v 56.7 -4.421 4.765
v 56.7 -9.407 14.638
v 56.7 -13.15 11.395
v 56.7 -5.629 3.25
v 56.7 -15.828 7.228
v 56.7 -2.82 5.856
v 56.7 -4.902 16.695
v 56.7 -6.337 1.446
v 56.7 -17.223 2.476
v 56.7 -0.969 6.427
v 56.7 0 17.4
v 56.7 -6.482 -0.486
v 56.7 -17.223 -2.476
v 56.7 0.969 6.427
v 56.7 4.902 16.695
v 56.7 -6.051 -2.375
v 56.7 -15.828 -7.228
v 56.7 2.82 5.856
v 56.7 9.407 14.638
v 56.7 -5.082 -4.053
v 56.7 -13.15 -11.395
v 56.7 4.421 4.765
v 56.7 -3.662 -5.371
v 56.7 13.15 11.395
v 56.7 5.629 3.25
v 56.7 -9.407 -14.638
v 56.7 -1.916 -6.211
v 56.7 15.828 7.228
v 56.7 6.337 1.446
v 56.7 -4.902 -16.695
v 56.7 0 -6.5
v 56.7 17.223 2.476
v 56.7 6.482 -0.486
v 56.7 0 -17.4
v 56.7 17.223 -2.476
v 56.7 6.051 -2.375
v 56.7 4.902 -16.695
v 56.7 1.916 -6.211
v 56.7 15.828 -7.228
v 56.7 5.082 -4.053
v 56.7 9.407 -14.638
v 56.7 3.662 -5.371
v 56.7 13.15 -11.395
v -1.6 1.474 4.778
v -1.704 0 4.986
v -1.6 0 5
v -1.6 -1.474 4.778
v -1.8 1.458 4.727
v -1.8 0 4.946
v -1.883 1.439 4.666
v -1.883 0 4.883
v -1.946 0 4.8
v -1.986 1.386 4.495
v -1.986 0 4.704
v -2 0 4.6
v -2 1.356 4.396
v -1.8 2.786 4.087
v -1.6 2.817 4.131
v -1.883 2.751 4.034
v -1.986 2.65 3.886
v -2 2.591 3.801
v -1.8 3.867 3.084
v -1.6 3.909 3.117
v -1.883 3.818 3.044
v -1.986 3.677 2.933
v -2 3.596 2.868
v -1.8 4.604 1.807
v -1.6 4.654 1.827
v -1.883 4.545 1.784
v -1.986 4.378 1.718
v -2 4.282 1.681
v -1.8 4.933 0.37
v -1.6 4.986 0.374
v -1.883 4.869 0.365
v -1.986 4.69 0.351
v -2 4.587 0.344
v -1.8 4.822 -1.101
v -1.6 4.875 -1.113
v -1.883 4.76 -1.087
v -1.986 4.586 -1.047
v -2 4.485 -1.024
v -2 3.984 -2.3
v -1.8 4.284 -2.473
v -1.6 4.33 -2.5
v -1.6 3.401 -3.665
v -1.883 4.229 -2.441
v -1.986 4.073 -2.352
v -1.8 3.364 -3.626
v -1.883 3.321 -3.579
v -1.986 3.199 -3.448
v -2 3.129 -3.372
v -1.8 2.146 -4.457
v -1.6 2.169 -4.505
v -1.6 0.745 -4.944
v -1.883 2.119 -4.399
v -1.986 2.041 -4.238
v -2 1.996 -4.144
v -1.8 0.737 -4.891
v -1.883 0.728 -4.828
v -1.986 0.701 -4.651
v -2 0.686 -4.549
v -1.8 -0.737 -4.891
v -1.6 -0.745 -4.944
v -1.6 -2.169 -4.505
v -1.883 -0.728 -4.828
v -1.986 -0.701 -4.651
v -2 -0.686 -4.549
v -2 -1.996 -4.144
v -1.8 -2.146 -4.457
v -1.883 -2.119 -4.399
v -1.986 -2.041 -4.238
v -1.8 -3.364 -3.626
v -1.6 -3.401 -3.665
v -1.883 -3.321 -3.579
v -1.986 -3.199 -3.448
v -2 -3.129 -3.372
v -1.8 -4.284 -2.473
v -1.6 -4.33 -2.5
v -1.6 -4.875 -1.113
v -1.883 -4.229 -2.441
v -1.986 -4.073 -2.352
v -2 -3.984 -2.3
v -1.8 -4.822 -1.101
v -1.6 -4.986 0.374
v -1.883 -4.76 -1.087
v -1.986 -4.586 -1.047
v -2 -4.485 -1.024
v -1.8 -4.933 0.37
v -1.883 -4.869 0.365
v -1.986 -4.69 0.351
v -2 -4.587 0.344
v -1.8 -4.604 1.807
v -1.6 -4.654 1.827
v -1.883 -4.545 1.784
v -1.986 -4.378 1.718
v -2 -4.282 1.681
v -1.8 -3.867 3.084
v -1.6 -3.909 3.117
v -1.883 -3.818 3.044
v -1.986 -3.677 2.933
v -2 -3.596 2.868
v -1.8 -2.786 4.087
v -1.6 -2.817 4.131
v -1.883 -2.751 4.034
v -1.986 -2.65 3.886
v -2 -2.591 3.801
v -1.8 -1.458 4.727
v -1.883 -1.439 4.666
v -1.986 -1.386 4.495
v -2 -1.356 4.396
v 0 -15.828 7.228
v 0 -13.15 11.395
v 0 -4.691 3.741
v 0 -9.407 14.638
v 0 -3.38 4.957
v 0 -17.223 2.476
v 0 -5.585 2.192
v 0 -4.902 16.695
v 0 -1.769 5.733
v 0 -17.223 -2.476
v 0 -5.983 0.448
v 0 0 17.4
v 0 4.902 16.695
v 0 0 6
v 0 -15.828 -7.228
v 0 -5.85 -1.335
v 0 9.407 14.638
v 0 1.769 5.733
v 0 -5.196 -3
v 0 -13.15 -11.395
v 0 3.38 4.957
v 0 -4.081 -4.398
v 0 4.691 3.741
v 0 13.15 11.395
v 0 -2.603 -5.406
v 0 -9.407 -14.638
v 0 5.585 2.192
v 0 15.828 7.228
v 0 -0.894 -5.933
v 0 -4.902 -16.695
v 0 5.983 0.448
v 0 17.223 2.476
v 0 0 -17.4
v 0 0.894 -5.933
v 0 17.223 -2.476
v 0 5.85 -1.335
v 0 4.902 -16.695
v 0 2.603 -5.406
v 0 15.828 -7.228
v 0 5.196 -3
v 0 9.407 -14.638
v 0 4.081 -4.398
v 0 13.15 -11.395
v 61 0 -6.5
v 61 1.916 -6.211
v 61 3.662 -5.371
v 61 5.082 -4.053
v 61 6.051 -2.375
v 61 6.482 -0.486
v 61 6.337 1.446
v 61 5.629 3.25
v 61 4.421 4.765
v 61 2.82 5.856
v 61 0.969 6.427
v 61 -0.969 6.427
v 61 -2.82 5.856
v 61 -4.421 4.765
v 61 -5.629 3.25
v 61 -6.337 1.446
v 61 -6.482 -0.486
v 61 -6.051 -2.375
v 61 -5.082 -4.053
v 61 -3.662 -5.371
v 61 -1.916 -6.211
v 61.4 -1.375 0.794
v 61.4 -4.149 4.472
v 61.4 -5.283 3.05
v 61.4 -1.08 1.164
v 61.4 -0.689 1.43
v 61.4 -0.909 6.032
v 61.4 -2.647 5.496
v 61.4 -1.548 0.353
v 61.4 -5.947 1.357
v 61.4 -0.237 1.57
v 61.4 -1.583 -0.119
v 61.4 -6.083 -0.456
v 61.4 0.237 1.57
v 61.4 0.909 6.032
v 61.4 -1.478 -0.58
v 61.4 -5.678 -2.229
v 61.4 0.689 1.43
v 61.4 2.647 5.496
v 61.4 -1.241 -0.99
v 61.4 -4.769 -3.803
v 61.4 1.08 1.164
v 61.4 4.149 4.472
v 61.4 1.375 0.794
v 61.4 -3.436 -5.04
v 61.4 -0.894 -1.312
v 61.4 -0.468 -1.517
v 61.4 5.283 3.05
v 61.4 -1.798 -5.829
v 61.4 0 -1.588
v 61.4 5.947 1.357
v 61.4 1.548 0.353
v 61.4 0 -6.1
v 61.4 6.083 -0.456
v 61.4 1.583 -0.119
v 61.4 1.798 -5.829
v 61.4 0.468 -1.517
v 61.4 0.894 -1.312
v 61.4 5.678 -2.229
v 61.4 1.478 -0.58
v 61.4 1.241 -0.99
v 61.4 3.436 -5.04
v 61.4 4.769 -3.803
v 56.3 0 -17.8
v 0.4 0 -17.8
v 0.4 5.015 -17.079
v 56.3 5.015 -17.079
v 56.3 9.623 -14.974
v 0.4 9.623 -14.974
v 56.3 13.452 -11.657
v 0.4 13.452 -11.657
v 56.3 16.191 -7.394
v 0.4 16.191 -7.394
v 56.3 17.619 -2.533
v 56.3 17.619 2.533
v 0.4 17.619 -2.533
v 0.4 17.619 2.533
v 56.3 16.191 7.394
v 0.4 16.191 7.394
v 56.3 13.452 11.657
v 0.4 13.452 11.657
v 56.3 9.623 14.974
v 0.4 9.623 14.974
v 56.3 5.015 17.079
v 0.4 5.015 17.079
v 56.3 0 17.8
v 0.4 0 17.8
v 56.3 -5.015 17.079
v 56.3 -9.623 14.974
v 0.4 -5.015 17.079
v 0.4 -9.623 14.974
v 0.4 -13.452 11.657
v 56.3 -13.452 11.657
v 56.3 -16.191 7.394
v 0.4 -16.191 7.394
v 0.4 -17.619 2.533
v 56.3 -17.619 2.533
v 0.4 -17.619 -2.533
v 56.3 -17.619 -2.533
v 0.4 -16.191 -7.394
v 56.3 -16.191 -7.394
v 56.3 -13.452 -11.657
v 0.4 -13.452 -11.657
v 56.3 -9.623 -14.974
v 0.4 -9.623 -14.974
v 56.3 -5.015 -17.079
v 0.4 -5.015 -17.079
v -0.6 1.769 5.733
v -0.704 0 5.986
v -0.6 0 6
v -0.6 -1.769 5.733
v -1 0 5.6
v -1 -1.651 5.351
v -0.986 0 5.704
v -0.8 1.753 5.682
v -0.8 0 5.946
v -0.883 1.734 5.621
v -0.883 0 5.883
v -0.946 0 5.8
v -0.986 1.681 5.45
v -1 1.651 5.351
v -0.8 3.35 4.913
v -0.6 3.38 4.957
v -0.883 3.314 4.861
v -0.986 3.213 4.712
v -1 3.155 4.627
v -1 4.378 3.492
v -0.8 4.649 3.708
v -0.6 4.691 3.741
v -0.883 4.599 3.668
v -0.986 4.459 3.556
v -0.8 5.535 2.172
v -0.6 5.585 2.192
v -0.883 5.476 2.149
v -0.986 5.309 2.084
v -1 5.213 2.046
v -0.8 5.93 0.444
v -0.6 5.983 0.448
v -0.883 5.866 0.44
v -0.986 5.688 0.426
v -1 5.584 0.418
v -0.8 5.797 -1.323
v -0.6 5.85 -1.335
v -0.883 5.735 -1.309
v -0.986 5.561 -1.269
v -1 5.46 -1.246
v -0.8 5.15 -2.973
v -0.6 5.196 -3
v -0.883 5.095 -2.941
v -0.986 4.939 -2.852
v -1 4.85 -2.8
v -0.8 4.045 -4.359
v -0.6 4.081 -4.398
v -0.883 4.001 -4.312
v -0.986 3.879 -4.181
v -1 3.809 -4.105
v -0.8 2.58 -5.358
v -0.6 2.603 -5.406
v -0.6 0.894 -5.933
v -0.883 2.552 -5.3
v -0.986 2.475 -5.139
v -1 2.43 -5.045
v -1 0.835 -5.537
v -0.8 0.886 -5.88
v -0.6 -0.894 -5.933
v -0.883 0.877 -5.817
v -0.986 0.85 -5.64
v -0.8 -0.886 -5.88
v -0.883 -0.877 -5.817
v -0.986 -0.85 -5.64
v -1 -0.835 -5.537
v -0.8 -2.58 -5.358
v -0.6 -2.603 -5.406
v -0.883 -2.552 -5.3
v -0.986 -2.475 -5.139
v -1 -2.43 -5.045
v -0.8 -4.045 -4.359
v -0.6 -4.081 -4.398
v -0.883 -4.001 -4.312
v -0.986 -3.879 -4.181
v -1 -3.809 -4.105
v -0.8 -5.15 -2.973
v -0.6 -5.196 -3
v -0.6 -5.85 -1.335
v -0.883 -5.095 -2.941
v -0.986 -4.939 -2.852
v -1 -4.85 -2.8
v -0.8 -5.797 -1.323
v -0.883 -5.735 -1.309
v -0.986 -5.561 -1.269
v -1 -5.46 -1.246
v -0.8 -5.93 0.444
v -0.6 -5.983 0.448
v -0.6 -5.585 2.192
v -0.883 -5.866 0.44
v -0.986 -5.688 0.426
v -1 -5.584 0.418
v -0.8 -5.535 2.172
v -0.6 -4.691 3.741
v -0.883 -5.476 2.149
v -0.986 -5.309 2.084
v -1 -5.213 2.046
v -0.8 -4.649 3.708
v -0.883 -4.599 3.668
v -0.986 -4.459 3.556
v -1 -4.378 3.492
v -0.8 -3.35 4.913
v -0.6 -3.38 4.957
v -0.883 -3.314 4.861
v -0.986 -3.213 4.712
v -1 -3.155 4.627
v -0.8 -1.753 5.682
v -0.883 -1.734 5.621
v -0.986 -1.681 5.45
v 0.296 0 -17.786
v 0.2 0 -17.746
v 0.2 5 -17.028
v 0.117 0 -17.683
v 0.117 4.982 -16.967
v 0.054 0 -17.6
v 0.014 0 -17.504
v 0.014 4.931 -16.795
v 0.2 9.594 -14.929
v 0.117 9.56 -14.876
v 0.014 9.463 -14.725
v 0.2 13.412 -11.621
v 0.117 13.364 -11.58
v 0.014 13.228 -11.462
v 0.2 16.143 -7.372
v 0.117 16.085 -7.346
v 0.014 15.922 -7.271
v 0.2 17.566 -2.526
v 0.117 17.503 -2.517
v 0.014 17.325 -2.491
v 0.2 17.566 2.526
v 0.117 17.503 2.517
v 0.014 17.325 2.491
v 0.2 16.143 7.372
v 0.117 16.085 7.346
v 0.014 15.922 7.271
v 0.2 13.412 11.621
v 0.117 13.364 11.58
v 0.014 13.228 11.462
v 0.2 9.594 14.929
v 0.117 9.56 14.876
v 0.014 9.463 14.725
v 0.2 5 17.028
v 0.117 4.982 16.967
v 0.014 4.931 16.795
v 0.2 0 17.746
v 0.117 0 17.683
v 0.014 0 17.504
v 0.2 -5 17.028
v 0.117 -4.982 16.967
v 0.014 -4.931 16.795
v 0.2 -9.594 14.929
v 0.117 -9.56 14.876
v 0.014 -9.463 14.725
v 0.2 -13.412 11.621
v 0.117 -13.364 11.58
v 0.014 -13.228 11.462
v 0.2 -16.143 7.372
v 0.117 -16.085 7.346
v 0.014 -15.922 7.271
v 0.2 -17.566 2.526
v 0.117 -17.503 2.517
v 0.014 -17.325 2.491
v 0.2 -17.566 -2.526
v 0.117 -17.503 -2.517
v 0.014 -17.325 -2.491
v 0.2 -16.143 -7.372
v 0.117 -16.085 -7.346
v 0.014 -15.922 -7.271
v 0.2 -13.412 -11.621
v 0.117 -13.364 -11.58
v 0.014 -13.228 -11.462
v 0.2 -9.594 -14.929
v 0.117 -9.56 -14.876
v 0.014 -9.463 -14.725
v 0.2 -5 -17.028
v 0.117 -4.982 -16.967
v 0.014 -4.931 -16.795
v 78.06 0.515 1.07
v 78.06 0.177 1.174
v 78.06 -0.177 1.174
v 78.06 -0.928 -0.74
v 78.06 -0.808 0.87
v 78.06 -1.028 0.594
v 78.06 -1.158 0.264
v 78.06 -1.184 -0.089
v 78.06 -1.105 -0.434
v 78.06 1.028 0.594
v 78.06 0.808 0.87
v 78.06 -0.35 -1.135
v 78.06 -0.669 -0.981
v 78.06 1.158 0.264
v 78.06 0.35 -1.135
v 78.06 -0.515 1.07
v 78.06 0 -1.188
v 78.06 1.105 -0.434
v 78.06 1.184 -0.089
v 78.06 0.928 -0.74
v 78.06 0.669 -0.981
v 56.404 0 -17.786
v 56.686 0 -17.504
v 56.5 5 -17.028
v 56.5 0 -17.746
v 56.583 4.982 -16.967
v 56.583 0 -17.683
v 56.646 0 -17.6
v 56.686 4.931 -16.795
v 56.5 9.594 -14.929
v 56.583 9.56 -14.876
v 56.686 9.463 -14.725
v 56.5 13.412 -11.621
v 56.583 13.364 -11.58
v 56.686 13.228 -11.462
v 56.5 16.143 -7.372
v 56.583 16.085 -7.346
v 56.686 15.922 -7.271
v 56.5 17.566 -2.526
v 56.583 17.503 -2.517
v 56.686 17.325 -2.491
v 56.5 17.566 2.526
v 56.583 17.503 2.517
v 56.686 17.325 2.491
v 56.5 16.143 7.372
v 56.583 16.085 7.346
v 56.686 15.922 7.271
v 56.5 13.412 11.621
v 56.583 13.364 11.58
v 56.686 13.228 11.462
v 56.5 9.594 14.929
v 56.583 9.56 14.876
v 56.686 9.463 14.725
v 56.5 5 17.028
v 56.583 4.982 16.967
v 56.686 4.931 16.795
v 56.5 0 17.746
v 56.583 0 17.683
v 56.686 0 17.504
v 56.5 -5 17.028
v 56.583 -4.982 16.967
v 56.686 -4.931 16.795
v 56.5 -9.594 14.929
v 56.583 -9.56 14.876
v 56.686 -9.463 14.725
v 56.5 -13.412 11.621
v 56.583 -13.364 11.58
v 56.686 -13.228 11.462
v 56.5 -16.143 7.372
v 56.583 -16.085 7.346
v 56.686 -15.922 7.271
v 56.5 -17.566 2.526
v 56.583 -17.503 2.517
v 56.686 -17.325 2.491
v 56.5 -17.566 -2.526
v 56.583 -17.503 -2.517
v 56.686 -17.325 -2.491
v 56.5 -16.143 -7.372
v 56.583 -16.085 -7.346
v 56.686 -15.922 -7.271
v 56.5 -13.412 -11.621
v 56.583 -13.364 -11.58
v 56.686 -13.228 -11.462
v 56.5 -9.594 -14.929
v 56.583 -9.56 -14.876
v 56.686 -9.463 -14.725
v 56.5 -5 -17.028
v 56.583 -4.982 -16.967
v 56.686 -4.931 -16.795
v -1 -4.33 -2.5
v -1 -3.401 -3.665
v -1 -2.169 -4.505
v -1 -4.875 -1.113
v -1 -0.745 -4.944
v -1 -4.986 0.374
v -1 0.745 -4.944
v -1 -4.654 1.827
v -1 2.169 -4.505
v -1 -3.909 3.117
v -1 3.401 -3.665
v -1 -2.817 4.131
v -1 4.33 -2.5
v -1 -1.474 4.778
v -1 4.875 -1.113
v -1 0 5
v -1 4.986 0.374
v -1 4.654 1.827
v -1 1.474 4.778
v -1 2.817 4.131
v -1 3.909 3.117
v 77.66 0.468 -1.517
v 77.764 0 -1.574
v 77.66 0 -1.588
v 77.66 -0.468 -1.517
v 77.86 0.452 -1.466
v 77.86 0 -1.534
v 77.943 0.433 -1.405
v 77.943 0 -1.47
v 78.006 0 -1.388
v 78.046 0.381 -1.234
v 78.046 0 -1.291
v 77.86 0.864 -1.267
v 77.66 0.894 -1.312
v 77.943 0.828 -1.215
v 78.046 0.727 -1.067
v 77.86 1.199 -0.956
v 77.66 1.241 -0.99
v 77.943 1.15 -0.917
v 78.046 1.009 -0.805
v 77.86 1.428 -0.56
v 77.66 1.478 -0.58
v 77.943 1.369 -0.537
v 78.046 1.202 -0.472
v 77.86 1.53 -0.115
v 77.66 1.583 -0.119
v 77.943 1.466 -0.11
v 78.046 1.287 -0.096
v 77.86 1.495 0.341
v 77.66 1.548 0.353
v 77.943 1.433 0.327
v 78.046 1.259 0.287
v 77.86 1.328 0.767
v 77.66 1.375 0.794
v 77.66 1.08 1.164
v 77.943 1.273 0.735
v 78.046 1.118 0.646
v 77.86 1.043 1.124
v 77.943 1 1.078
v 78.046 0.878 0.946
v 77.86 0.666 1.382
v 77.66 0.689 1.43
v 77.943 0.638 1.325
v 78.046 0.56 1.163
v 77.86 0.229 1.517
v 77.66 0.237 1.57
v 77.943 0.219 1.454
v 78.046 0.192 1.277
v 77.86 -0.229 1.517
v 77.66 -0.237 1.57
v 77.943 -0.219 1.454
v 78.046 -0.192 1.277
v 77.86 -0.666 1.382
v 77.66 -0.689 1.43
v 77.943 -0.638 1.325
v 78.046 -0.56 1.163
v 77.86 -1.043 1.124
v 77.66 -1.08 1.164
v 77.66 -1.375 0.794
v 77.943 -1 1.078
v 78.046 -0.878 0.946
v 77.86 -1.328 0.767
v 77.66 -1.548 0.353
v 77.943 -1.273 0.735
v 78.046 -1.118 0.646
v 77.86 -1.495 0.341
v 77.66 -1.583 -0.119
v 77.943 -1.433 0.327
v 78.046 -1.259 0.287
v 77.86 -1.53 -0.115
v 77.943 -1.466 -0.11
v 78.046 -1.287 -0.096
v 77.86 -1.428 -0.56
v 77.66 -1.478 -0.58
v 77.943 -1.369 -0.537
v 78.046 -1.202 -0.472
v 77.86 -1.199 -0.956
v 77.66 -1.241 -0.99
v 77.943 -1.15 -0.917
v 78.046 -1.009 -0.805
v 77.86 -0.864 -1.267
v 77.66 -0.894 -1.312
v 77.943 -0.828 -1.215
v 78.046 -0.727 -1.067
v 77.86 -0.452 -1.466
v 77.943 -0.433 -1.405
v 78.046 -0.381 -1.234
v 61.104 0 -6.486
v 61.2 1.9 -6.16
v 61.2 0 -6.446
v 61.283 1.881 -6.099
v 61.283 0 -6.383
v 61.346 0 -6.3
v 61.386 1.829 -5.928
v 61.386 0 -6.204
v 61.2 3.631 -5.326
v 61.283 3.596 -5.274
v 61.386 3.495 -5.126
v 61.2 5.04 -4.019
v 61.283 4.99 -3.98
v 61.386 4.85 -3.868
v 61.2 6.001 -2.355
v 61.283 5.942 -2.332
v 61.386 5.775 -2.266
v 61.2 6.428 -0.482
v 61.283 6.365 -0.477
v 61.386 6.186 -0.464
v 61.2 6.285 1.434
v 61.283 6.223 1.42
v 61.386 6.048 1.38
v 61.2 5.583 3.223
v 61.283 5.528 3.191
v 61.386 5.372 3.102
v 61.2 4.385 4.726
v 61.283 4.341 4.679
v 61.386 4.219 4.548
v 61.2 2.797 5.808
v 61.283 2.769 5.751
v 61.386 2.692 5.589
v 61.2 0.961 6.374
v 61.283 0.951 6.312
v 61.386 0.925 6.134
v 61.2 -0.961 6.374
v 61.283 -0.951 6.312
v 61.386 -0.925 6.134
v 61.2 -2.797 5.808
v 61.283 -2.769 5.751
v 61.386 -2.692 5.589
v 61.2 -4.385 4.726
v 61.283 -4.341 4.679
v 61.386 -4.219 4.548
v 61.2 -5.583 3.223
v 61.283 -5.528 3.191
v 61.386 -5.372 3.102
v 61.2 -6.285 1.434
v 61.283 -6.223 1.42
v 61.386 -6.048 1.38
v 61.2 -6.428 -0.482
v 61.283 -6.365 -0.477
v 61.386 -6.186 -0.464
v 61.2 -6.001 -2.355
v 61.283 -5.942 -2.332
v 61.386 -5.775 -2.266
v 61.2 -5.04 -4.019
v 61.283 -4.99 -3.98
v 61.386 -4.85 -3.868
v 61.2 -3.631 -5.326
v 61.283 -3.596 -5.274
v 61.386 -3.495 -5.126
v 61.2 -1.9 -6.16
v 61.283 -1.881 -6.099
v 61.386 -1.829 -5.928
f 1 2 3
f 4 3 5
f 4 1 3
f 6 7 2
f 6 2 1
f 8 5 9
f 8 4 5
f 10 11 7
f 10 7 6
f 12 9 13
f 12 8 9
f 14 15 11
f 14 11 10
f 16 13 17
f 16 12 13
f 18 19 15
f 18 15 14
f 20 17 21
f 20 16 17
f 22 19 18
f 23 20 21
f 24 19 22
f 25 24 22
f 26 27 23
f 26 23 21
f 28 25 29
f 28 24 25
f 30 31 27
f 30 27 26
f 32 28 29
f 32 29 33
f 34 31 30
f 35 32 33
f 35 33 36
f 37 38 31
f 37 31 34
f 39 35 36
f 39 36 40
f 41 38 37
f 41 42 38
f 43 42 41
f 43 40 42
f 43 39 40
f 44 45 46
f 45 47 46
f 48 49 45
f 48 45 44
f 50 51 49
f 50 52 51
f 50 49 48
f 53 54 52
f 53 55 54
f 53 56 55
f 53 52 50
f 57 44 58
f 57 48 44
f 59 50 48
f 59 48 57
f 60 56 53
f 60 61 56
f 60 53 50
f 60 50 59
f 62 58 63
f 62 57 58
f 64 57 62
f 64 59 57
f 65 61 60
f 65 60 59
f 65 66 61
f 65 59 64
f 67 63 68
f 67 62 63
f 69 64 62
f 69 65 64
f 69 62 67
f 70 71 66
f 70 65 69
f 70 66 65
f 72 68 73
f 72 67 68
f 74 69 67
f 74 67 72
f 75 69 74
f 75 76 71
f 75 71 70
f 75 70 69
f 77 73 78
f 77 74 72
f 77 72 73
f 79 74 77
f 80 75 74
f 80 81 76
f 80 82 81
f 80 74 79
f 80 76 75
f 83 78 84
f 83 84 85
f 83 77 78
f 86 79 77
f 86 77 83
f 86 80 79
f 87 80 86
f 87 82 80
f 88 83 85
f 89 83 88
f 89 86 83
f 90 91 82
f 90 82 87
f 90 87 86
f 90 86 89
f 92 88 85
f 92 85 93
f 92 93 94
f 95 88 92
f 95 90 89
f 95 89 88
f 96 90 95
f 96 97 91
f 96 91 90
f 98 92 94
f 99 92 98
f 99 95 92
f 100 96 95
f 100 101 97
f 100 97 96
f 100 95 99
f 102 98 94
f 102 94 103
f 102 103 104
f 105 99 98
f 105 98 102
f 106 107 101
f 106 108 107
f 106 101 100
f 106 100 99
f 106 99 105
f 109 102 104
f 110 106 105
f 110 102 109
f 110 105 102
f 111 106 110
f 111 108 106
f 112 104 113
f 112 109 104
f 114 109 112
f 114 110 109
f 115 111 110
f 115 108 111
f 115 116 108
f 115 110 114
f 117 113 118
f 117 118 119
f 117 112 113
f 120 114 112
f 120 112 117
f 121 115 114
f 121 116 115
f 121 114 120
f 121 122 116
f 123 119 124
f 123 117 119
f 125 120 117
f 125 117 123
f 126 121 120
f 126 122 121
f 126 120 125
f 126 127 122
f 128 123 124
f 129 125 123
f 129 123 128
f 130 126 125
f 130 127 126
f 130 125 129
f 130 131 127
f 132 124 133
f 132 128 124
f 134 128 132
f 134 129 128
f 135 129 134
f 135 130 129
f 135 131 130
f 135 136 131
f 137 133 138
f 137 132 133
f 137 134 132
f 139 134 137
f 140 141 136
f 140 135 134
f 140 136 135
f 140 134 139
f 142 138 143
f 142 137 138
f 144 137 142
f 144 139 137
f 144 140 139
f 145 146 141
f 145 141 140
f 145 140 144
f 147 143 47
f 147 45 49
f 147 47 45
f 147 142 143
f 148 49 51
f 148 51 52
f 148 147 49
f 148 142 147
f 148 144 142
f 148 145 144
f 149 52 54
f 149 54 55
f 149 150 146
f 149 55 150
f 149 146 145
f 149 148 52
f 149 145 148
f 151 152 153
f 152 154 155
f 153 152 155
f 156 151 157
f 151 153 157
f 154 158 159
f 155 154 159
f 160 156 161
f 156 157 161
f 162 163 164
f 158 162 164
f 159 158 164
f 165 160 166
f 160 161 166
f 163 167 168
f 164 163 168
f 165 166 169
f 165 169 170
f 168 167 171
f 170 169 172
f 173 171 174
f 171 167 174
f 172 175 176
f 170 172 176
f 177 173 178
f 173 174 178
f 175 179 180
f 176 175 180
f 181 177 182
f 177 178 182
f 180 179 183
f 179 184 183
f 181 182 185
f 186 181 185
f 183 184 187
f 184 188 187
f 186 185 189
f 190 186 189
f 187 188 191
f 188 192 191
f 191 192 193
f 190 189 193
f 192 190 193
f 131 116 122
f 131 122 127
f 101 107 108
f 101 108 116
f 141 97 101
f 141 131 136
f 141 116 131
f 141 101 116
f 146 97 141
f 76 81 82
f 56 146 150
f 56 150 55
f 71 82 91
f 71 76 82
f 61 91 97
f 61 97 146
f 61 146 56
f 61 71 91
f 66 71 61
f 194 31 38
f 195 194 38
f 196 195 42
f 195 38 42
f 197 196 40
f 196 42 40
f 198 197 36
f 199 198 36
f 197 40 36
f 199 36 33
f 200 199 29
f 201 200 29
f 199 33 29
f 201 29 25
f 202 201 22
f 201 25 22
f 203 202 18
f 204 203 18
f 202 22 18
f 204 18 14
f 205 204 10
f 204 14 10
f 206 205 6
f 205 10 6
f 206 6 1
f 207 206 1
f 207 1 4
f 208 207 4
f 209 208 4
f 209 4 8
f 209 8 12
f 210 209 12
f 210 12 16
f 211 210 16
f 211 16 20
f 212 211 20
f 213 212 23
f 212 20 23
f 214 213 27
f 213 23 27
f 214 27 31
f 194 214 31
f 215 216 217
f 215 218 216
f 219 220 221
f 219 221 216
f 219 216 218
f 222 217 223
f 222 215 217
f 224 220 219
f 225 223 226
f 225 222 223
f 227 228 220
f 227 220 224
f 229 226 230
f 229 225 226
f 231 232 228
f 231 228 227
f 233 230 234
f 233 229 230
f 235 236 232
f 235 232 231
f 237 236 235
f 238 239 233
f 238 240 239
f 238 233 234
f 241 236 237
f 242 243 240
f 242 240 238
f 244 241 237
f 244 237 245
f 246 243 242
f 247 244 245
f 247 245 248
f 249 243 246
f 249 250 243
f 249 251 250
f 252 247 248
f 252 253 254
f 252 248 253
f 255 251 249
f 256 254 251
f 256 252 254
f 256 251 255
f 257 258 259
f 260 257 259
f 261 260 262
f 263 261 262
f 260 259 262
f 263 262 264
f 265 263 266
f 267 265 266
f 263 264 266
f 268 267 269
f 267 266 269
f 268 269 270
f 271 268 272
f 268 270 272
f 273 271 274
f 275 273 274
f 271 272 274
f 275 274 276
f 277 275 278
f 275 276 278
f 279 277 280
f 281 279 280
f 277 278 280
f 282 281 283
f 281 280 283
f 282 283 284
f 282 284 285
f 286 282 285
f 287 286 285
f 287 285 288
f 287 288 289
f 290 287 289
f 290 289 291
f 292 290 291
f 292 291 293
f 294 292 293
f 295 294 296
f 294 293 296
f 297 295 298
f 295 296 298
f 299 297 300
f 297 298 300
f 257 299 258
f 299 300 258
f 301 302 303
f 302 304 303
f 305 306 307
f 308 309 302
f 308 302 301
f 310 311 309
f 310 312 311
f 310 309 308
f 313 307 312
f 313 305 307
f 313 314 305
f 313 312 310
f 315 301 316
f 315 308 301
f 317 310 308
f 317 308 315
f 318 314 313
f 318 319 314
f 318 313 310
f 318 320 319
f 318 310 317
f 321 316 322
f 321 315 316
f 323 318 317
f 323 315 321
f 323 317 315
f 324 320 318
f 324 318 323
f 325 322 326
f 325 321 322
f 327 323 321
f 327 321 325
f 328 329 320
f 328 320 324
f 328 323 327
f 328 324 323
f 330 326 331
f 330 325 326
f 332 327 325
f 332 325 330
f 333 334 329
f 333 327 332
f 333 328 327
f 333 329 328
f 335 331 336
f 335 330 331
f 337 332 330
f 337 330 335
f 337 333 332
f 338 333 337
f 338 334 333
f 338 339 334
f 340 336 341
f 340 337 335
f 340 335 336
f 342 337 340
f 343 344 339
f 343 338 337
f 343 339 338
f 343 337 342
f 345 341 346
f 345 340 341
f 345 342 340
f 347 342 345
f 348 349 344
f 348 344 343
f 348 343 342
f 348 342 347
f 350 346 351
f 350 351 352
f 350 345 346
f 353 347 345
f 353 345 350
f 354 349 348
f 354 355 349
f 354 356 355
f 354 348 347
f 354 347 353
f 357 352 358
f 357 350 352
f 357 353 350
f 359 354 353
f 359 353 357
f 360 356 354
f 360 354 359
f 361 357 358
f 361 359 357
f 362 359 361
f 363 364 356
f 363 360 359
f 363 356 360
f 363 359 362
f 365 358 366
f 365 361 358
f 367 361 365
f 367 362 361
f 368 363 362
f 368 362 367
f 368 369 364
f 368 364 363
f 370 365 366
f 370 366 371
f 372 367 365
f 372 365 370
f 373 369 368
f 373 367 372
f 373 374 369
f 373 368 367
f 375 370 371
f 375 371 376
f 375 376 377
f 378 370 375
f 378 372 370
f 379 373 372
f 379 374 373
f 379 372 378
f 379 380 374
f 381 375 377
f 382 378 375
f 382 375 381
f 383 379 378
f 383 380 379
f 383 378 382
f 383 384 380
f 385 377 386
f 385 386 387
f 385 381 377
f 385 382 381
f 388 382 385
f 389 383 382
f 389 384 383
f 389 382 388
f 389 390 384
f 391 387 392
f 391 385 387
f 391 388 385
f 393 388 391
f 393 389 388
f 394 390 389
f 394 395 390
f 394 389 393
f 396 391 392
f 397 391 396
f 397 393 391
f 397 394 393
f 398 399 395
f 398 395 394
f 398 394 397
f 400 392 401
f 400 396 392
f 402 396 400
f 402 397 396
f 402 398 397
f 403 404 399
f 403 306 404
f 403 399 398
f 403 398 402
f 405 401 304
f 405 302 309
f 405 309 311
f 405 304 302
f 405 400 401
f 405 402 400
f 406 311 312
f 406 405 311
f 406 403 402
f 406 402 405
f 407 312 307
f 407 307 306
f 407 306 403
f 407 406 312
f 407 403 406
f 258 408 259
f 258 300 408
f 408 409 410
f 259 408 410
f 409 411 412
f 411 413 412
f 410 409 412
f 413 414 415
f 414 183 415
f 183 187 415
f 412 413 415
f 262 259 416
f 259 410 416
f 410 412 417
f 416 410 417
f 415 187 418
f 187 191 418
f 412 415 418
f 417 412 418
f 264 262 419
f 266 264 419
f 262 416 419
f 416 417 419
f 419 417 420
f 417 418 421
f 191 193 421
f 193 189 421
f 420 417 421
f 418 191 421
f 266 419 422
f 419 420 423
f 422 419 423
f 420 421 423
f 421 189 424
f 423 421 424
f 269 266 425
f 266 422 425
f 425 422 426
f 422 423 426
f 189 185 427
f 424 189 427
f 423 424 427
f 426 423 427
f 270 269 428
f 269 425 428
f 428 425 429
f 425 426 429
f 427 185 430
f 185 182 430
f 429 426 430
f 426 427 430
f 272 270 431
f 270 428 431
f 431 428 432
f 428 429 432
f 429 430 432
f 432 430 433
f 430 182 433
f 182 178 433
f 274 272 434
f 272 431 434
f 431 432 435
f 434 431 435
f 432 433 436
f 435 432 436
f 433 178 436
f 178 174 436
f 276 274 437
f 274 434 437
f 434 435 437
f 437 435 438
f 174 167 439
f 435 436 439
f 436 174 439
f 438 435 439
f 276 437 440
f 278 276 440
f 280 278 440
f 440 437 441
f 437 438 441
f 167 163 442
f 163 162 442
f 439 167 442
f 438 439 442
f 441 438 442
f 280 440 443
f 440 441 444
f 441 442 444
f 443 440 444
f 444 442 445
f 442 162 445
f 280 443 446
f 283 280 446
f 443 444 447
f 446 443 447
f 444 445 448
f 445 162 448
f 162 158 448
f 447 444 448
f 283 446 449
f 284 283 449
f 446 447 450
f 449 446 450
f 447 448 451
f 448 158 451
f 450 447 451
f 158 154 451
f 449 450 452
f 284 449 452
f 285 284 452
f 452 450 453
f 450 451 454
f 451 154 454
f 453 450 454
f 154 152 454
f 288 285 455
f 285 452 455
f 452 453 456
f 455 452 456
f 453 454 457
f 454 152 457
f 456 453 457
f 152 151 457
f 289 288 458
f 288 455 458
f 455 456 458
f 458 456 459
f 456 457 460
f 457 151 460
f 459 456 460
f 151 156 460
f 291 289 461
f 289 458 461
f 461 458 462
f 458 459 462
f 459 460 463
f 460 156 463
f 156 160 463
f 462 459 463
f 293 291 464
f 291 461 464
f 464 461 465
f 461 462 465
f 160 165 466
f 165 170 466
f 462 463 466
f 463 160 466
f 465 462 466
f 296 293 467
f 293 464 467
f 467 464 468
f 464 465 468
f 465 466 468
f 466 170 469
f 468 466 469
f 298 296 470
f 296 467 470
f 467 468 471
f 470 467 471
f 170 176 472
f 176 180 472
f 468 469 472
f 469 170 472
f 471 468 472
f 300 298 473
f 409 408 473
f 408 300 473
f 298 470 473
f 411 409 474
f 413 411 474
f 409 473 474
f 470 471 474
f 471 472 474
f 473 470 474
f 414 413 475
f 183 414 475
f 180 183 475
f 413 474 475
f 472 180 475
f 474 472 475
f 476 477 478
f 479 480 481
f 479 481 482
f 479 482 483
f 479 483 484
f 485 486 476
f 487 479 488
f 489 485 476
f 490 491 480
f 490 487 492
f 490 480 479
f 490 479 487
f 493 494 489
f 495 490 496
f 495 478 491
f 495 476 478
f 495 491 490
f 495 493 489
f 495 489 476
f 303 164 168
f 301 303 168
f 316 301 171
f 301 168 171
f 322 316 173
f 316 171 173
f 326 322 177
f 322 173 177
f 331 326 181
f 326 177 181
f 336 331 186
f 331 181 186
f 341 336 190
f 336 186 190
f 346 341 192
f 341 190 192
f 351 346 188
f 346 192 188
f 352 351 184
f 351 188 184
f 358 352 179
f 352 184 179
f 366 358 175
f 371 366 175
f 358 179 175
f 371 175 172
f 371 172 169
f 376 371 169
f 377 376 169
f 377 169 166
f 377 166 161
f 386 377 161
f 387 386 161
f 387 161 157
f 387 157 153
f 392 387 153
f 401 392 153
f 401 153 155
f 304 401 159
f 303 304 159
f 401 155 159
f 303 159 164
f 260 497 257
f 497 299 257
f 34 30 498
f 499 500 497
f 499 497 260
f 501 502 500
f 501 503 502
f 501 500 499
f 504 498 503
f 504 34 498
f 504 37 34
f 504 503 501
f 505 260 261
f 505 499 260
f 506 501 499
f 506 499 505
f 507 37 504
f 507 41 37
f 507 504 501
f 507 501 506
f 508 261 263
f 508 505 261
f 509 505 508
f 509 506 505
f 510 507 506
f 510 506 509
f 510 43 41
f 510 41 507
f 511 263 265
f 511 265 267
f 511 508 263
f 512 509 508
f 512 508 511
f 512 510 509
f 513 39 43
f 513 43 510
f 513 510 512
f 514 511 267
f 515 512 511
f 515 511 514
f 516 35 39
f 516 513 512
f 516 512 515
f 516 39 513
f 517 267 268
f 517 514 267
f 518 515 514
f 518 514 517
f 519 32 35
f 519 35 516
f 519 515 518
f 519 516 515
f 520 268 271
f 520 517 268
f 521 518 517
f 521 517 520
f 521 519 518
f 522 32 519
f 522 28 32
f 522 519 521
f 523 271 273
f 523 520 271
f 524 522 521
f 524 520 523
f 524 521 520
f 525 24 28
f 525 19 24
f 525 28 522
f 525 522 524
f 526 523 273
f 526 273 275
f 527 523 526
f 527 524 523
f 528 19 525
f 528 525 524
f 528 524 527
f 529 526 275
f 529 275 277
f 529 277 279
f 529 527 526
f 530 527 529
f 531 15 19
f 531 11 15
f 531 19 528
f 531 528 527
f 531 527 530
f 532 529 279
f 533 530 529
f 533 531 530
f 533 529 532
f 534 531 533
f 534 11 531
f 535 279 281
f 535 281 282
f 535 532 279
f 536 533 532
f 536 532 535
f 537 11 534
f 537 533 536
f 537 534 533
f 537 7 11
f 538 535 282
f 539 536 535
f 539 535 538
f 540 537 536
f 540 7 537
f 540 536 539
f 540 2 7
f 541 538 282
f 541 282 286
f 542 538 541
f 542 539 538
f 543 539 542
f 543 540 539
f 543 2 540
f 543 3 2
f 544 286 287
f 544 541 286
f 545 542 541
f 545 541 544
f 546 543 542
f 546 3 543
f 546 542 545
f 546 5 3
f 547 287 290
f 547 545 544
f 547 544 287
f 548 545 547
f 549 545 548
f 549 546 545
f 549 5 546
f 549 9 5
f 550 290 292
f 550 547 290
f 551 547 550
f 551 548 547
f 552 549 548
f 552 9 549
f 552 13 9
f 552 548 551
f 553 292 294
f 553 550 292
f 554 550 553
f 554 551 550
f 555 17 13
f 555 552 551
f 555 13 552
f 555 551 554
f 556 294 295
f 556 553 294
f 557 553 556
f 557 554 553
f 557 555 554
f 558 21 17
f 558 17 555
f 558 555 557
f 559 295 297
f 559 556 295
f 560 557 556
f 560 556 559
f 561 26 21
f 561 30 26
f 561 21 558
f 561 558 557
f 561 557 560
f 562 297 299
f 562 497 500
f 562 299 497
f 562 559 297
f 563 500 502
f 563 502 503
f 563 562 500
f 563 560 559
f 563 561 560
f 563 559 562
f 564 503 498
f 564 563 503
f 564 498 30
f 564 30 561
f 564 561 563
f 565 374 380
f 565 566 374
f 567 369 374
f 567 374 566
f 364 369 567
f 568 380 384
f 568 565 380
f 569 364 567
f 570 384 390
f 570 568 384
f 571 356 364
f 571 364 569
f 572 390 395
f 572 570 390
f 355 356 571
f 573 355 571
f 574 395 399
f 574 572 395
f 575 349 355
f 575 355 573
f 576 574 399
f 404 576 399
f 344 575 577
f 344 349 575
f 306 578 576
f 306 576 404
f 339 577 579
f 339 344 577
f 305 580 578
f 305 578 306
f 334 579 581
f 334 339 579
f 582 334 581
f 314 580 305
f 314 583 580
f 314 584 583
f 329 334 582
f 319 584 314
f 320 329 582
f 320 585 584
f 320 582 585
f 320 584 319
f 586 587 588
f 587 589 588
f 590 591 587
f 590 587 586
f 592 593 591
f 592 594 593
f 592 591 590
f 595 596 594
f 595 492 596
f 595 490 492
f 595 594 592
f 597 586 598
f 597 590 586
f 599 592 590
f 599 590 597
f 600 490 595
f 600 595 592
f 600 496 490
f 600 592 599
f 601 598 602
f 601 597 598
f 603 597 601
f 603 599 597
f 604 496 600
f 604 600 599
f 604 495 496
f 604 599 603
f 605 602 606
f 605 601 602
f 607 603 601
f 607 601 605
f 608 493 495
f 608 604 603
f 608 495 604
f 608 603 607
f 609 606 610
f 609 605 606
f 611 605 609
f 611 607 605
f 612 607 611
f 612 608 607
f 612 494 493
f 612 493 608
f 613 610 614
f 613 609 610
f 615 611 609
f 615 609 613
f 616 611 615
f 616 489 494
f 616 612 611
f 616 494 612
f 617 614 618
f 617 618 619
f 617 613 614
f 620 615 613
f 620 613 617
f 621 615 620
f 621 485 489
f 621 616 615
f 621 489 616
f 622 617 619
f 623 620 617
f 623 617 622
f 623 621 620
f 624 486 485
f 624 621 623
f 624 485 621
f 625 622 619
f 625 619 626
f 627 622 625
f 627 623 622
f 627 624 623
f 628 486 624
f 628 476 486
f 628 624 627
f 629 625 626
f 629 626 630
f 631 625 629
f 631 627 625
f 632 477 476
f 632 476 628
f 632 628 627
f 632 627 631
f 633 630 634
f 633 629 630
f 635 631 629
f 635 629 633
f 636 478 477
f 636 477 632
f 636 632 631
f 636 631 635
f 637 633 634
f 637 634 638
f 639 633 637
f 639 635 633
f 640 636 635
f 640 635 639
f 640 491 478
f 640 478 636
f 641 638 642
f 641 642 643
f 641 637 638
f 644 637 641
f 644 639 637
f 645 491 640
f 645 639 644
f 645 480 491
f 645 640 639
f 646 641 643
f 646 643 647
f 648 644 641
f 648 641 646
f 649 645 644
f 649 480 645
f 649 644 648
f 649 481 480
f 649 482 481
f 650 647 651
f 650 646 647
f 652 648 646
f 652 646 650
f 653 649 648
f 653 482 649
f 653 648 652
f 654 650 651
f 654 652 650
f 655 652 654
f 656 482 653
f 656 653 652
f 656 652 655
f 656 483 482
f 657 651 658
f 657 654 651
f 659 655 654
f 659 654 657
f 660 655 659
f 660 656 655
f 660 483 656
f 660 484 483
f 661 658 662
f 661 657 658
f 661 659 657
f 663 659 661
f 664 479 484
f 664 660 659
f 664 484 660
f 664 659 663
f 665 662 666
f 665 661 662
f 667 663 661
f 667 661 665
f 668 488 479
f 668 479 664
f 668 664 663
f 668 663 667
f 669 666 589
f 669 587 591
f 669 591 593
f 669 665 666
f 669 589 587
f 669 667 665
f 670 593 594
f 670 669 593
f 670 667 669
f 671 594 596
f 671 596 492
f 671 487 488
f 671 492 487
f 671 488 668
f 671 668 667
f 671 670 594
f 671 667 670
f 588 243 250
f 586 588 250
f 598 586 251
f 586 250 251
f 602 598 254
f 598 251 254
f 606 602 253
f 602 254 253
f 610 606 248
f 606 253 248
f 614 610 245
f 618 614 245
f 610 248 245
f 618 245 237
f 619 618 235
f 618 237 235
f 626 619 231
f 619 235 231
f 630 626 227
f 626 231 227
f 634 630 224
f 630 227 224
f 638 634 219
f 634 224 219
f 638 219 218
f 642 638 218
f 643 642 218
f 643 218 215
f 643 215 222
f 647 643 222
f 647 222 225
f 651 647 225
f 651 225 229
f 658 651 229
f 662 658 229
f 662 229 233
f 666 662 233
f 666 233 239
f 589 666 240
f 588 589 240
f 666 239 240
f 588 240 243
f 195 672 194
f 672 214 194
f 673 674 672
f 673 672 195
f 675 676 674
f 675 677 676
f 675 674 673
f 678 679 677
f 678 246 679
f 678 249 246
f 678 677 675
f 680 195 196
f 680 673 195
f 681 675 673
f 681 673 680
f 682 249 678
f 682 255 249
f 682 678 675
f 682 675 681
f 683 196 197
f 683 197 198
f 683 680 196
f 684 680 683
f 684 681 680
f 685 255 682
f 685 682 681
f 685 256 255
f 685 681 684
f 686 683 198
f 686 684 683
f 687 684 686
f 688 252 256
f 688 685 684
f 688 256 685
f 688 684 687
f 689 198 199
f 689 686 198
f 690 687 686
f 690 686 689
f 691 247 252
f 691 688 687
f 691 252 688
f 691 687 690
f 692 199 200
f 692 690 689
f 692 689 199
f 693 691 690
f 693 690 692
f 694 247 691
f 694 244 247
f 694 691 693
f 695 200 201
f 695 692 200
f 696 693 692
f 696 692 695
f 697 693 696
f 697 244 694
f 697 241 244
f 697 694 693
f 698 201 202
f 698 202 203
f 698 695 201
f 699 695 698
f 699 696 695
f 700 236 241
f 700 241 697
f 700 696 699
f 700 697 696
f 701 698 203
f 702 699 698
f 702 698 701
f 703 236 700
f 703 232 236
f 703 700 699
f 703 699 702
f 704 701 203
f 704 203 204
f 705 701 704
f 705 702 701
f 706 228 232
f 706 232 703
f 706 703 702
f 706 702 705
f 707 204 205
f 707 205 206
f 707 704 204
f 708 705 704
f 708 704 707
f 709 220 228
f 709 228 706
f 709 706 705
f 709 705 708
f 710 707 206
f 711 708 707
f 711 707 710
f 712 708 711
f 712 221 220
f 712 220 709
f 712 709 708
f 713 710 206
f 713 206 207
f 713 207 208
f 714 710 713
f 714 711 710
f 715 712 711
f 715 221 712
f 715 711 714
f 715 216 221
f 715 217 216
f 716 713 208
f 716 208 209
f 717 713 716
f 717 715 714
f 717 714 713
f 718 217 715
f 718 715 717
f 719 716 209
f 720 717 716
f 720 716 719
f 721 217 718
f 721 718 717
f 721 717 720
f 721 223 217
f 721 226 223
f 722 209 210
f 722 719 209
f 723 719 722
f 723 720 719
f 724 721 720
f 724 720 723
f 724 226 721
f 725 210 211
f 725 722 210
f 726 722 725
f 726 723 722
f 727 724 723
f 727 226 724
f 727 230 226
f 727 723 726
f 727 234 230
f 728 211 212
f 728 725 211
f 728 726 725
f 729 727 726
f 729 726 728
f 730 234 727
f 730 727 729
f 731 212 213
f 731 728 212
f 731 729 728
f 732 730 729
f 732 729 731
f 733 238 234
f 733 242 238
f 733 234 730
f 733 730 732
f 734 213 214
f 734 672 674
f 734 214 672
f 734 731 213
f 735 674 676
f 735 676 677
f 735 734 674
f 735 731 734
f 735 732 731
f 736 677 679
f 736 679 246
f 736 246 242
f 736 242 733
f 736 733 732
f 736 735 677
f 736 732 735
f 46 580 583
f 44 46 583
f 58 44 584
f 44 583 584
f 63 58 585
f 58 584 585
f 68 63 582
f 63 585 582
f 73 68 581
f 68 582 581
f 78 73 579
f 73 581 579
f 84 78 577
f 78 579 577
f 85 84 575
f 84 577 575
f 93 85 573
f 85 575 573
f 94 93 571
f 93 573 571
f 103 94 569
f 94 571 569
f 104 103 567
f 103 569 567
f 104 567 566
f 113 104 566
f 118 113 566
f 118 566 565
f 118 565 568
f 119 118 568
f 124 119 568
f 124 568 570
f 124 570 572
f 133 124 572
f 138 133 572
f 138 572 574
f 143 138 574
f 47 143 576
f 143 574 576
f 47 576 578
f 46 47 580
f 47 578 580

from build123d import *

# Parameters (mm, degrees)
CROQUIS1_R              = 17.8
SALIENTE_EXTRUIR1_DEPTH = 56.7
CROQUIS2_R              = 6
SALIENTE_EXTRUIR2_DEPTH = 1
CROQUIS3_R              = 5
SALIENTE_EXTRUIR3_DEPTH = 1
CROQUIS4_R              = 6.5
SALIENTE_EXTRUIR4_DEPTH = 4.7
CROQUIS5_R              = 1.5875
SALIENTE_EXTRUIR5_DEPTH = 16.66
REDONDEO1_R             = 0.4


with BuildPart() as part:
    # Croquis1 → Saliente-Extruir1 (new body)
    with BuildSketch(Plane(origin=(0, 0, 0), x_dir=(0, 0, -1), z_dir=(1, 0, 0))):
        Circle(CROQUIS1_R)
    extrude(amount=SALIENTE_EXTRUIR1_DEPTH)

    # Croquis2 → Saliente-Extruir2 (add)
    with BuildSketch(Plane.ZY):
        Circle(CROQUIS2_R)
    extrude(amount=SALIENTE_EXTRUIR2_DEPTH)

    # Croquis3 → Saliente-Extruir3 (add)
    with BuildSketch(Plane.ZY.offset(1)):
        Circle(CROQUIS3_R)
    extrude(amount=SALIENTE_EXTRUIR3_DEPTH)

    # Croquis4 → Saliente-Extruir4 (add)
    with BuildSketch(Plane(origin=(56.7, 0, 0), x_dir=(0, 0, -1), z_dir=(1, 0, 0))):
        Circle(CROQUIS4_R)
    extrude(amount=SALIENTE_EXTRUIR4_DEPTH)

    # Croquis5 → Saliente-Extruir5 (add)
    with BuildSketch(Plane(origin=(61.4, 0, 0), x_dir=(0, 0, -1), z_dir=(1, 0, 0))):
        Circle(CROQUIS5_R)
    extrude(amount=SALIENTE_EXTRUIR5_DEPTH)

    # Redondeo1
    redondeo1_edges = [part.edges().sort_by_distance(p)[0] for p in [
        (-2, 0, -5),
        (61.4, 0, 6.5),
        (0, 0, 17.8),
        (78.06, 0, 1.5875),
        (56.7, 0, 17.8),
        (-1, 0, -6),
    ]]
    fillet(redondeo1_edges, radius=REDONDEO1_R)


solid = part.part
